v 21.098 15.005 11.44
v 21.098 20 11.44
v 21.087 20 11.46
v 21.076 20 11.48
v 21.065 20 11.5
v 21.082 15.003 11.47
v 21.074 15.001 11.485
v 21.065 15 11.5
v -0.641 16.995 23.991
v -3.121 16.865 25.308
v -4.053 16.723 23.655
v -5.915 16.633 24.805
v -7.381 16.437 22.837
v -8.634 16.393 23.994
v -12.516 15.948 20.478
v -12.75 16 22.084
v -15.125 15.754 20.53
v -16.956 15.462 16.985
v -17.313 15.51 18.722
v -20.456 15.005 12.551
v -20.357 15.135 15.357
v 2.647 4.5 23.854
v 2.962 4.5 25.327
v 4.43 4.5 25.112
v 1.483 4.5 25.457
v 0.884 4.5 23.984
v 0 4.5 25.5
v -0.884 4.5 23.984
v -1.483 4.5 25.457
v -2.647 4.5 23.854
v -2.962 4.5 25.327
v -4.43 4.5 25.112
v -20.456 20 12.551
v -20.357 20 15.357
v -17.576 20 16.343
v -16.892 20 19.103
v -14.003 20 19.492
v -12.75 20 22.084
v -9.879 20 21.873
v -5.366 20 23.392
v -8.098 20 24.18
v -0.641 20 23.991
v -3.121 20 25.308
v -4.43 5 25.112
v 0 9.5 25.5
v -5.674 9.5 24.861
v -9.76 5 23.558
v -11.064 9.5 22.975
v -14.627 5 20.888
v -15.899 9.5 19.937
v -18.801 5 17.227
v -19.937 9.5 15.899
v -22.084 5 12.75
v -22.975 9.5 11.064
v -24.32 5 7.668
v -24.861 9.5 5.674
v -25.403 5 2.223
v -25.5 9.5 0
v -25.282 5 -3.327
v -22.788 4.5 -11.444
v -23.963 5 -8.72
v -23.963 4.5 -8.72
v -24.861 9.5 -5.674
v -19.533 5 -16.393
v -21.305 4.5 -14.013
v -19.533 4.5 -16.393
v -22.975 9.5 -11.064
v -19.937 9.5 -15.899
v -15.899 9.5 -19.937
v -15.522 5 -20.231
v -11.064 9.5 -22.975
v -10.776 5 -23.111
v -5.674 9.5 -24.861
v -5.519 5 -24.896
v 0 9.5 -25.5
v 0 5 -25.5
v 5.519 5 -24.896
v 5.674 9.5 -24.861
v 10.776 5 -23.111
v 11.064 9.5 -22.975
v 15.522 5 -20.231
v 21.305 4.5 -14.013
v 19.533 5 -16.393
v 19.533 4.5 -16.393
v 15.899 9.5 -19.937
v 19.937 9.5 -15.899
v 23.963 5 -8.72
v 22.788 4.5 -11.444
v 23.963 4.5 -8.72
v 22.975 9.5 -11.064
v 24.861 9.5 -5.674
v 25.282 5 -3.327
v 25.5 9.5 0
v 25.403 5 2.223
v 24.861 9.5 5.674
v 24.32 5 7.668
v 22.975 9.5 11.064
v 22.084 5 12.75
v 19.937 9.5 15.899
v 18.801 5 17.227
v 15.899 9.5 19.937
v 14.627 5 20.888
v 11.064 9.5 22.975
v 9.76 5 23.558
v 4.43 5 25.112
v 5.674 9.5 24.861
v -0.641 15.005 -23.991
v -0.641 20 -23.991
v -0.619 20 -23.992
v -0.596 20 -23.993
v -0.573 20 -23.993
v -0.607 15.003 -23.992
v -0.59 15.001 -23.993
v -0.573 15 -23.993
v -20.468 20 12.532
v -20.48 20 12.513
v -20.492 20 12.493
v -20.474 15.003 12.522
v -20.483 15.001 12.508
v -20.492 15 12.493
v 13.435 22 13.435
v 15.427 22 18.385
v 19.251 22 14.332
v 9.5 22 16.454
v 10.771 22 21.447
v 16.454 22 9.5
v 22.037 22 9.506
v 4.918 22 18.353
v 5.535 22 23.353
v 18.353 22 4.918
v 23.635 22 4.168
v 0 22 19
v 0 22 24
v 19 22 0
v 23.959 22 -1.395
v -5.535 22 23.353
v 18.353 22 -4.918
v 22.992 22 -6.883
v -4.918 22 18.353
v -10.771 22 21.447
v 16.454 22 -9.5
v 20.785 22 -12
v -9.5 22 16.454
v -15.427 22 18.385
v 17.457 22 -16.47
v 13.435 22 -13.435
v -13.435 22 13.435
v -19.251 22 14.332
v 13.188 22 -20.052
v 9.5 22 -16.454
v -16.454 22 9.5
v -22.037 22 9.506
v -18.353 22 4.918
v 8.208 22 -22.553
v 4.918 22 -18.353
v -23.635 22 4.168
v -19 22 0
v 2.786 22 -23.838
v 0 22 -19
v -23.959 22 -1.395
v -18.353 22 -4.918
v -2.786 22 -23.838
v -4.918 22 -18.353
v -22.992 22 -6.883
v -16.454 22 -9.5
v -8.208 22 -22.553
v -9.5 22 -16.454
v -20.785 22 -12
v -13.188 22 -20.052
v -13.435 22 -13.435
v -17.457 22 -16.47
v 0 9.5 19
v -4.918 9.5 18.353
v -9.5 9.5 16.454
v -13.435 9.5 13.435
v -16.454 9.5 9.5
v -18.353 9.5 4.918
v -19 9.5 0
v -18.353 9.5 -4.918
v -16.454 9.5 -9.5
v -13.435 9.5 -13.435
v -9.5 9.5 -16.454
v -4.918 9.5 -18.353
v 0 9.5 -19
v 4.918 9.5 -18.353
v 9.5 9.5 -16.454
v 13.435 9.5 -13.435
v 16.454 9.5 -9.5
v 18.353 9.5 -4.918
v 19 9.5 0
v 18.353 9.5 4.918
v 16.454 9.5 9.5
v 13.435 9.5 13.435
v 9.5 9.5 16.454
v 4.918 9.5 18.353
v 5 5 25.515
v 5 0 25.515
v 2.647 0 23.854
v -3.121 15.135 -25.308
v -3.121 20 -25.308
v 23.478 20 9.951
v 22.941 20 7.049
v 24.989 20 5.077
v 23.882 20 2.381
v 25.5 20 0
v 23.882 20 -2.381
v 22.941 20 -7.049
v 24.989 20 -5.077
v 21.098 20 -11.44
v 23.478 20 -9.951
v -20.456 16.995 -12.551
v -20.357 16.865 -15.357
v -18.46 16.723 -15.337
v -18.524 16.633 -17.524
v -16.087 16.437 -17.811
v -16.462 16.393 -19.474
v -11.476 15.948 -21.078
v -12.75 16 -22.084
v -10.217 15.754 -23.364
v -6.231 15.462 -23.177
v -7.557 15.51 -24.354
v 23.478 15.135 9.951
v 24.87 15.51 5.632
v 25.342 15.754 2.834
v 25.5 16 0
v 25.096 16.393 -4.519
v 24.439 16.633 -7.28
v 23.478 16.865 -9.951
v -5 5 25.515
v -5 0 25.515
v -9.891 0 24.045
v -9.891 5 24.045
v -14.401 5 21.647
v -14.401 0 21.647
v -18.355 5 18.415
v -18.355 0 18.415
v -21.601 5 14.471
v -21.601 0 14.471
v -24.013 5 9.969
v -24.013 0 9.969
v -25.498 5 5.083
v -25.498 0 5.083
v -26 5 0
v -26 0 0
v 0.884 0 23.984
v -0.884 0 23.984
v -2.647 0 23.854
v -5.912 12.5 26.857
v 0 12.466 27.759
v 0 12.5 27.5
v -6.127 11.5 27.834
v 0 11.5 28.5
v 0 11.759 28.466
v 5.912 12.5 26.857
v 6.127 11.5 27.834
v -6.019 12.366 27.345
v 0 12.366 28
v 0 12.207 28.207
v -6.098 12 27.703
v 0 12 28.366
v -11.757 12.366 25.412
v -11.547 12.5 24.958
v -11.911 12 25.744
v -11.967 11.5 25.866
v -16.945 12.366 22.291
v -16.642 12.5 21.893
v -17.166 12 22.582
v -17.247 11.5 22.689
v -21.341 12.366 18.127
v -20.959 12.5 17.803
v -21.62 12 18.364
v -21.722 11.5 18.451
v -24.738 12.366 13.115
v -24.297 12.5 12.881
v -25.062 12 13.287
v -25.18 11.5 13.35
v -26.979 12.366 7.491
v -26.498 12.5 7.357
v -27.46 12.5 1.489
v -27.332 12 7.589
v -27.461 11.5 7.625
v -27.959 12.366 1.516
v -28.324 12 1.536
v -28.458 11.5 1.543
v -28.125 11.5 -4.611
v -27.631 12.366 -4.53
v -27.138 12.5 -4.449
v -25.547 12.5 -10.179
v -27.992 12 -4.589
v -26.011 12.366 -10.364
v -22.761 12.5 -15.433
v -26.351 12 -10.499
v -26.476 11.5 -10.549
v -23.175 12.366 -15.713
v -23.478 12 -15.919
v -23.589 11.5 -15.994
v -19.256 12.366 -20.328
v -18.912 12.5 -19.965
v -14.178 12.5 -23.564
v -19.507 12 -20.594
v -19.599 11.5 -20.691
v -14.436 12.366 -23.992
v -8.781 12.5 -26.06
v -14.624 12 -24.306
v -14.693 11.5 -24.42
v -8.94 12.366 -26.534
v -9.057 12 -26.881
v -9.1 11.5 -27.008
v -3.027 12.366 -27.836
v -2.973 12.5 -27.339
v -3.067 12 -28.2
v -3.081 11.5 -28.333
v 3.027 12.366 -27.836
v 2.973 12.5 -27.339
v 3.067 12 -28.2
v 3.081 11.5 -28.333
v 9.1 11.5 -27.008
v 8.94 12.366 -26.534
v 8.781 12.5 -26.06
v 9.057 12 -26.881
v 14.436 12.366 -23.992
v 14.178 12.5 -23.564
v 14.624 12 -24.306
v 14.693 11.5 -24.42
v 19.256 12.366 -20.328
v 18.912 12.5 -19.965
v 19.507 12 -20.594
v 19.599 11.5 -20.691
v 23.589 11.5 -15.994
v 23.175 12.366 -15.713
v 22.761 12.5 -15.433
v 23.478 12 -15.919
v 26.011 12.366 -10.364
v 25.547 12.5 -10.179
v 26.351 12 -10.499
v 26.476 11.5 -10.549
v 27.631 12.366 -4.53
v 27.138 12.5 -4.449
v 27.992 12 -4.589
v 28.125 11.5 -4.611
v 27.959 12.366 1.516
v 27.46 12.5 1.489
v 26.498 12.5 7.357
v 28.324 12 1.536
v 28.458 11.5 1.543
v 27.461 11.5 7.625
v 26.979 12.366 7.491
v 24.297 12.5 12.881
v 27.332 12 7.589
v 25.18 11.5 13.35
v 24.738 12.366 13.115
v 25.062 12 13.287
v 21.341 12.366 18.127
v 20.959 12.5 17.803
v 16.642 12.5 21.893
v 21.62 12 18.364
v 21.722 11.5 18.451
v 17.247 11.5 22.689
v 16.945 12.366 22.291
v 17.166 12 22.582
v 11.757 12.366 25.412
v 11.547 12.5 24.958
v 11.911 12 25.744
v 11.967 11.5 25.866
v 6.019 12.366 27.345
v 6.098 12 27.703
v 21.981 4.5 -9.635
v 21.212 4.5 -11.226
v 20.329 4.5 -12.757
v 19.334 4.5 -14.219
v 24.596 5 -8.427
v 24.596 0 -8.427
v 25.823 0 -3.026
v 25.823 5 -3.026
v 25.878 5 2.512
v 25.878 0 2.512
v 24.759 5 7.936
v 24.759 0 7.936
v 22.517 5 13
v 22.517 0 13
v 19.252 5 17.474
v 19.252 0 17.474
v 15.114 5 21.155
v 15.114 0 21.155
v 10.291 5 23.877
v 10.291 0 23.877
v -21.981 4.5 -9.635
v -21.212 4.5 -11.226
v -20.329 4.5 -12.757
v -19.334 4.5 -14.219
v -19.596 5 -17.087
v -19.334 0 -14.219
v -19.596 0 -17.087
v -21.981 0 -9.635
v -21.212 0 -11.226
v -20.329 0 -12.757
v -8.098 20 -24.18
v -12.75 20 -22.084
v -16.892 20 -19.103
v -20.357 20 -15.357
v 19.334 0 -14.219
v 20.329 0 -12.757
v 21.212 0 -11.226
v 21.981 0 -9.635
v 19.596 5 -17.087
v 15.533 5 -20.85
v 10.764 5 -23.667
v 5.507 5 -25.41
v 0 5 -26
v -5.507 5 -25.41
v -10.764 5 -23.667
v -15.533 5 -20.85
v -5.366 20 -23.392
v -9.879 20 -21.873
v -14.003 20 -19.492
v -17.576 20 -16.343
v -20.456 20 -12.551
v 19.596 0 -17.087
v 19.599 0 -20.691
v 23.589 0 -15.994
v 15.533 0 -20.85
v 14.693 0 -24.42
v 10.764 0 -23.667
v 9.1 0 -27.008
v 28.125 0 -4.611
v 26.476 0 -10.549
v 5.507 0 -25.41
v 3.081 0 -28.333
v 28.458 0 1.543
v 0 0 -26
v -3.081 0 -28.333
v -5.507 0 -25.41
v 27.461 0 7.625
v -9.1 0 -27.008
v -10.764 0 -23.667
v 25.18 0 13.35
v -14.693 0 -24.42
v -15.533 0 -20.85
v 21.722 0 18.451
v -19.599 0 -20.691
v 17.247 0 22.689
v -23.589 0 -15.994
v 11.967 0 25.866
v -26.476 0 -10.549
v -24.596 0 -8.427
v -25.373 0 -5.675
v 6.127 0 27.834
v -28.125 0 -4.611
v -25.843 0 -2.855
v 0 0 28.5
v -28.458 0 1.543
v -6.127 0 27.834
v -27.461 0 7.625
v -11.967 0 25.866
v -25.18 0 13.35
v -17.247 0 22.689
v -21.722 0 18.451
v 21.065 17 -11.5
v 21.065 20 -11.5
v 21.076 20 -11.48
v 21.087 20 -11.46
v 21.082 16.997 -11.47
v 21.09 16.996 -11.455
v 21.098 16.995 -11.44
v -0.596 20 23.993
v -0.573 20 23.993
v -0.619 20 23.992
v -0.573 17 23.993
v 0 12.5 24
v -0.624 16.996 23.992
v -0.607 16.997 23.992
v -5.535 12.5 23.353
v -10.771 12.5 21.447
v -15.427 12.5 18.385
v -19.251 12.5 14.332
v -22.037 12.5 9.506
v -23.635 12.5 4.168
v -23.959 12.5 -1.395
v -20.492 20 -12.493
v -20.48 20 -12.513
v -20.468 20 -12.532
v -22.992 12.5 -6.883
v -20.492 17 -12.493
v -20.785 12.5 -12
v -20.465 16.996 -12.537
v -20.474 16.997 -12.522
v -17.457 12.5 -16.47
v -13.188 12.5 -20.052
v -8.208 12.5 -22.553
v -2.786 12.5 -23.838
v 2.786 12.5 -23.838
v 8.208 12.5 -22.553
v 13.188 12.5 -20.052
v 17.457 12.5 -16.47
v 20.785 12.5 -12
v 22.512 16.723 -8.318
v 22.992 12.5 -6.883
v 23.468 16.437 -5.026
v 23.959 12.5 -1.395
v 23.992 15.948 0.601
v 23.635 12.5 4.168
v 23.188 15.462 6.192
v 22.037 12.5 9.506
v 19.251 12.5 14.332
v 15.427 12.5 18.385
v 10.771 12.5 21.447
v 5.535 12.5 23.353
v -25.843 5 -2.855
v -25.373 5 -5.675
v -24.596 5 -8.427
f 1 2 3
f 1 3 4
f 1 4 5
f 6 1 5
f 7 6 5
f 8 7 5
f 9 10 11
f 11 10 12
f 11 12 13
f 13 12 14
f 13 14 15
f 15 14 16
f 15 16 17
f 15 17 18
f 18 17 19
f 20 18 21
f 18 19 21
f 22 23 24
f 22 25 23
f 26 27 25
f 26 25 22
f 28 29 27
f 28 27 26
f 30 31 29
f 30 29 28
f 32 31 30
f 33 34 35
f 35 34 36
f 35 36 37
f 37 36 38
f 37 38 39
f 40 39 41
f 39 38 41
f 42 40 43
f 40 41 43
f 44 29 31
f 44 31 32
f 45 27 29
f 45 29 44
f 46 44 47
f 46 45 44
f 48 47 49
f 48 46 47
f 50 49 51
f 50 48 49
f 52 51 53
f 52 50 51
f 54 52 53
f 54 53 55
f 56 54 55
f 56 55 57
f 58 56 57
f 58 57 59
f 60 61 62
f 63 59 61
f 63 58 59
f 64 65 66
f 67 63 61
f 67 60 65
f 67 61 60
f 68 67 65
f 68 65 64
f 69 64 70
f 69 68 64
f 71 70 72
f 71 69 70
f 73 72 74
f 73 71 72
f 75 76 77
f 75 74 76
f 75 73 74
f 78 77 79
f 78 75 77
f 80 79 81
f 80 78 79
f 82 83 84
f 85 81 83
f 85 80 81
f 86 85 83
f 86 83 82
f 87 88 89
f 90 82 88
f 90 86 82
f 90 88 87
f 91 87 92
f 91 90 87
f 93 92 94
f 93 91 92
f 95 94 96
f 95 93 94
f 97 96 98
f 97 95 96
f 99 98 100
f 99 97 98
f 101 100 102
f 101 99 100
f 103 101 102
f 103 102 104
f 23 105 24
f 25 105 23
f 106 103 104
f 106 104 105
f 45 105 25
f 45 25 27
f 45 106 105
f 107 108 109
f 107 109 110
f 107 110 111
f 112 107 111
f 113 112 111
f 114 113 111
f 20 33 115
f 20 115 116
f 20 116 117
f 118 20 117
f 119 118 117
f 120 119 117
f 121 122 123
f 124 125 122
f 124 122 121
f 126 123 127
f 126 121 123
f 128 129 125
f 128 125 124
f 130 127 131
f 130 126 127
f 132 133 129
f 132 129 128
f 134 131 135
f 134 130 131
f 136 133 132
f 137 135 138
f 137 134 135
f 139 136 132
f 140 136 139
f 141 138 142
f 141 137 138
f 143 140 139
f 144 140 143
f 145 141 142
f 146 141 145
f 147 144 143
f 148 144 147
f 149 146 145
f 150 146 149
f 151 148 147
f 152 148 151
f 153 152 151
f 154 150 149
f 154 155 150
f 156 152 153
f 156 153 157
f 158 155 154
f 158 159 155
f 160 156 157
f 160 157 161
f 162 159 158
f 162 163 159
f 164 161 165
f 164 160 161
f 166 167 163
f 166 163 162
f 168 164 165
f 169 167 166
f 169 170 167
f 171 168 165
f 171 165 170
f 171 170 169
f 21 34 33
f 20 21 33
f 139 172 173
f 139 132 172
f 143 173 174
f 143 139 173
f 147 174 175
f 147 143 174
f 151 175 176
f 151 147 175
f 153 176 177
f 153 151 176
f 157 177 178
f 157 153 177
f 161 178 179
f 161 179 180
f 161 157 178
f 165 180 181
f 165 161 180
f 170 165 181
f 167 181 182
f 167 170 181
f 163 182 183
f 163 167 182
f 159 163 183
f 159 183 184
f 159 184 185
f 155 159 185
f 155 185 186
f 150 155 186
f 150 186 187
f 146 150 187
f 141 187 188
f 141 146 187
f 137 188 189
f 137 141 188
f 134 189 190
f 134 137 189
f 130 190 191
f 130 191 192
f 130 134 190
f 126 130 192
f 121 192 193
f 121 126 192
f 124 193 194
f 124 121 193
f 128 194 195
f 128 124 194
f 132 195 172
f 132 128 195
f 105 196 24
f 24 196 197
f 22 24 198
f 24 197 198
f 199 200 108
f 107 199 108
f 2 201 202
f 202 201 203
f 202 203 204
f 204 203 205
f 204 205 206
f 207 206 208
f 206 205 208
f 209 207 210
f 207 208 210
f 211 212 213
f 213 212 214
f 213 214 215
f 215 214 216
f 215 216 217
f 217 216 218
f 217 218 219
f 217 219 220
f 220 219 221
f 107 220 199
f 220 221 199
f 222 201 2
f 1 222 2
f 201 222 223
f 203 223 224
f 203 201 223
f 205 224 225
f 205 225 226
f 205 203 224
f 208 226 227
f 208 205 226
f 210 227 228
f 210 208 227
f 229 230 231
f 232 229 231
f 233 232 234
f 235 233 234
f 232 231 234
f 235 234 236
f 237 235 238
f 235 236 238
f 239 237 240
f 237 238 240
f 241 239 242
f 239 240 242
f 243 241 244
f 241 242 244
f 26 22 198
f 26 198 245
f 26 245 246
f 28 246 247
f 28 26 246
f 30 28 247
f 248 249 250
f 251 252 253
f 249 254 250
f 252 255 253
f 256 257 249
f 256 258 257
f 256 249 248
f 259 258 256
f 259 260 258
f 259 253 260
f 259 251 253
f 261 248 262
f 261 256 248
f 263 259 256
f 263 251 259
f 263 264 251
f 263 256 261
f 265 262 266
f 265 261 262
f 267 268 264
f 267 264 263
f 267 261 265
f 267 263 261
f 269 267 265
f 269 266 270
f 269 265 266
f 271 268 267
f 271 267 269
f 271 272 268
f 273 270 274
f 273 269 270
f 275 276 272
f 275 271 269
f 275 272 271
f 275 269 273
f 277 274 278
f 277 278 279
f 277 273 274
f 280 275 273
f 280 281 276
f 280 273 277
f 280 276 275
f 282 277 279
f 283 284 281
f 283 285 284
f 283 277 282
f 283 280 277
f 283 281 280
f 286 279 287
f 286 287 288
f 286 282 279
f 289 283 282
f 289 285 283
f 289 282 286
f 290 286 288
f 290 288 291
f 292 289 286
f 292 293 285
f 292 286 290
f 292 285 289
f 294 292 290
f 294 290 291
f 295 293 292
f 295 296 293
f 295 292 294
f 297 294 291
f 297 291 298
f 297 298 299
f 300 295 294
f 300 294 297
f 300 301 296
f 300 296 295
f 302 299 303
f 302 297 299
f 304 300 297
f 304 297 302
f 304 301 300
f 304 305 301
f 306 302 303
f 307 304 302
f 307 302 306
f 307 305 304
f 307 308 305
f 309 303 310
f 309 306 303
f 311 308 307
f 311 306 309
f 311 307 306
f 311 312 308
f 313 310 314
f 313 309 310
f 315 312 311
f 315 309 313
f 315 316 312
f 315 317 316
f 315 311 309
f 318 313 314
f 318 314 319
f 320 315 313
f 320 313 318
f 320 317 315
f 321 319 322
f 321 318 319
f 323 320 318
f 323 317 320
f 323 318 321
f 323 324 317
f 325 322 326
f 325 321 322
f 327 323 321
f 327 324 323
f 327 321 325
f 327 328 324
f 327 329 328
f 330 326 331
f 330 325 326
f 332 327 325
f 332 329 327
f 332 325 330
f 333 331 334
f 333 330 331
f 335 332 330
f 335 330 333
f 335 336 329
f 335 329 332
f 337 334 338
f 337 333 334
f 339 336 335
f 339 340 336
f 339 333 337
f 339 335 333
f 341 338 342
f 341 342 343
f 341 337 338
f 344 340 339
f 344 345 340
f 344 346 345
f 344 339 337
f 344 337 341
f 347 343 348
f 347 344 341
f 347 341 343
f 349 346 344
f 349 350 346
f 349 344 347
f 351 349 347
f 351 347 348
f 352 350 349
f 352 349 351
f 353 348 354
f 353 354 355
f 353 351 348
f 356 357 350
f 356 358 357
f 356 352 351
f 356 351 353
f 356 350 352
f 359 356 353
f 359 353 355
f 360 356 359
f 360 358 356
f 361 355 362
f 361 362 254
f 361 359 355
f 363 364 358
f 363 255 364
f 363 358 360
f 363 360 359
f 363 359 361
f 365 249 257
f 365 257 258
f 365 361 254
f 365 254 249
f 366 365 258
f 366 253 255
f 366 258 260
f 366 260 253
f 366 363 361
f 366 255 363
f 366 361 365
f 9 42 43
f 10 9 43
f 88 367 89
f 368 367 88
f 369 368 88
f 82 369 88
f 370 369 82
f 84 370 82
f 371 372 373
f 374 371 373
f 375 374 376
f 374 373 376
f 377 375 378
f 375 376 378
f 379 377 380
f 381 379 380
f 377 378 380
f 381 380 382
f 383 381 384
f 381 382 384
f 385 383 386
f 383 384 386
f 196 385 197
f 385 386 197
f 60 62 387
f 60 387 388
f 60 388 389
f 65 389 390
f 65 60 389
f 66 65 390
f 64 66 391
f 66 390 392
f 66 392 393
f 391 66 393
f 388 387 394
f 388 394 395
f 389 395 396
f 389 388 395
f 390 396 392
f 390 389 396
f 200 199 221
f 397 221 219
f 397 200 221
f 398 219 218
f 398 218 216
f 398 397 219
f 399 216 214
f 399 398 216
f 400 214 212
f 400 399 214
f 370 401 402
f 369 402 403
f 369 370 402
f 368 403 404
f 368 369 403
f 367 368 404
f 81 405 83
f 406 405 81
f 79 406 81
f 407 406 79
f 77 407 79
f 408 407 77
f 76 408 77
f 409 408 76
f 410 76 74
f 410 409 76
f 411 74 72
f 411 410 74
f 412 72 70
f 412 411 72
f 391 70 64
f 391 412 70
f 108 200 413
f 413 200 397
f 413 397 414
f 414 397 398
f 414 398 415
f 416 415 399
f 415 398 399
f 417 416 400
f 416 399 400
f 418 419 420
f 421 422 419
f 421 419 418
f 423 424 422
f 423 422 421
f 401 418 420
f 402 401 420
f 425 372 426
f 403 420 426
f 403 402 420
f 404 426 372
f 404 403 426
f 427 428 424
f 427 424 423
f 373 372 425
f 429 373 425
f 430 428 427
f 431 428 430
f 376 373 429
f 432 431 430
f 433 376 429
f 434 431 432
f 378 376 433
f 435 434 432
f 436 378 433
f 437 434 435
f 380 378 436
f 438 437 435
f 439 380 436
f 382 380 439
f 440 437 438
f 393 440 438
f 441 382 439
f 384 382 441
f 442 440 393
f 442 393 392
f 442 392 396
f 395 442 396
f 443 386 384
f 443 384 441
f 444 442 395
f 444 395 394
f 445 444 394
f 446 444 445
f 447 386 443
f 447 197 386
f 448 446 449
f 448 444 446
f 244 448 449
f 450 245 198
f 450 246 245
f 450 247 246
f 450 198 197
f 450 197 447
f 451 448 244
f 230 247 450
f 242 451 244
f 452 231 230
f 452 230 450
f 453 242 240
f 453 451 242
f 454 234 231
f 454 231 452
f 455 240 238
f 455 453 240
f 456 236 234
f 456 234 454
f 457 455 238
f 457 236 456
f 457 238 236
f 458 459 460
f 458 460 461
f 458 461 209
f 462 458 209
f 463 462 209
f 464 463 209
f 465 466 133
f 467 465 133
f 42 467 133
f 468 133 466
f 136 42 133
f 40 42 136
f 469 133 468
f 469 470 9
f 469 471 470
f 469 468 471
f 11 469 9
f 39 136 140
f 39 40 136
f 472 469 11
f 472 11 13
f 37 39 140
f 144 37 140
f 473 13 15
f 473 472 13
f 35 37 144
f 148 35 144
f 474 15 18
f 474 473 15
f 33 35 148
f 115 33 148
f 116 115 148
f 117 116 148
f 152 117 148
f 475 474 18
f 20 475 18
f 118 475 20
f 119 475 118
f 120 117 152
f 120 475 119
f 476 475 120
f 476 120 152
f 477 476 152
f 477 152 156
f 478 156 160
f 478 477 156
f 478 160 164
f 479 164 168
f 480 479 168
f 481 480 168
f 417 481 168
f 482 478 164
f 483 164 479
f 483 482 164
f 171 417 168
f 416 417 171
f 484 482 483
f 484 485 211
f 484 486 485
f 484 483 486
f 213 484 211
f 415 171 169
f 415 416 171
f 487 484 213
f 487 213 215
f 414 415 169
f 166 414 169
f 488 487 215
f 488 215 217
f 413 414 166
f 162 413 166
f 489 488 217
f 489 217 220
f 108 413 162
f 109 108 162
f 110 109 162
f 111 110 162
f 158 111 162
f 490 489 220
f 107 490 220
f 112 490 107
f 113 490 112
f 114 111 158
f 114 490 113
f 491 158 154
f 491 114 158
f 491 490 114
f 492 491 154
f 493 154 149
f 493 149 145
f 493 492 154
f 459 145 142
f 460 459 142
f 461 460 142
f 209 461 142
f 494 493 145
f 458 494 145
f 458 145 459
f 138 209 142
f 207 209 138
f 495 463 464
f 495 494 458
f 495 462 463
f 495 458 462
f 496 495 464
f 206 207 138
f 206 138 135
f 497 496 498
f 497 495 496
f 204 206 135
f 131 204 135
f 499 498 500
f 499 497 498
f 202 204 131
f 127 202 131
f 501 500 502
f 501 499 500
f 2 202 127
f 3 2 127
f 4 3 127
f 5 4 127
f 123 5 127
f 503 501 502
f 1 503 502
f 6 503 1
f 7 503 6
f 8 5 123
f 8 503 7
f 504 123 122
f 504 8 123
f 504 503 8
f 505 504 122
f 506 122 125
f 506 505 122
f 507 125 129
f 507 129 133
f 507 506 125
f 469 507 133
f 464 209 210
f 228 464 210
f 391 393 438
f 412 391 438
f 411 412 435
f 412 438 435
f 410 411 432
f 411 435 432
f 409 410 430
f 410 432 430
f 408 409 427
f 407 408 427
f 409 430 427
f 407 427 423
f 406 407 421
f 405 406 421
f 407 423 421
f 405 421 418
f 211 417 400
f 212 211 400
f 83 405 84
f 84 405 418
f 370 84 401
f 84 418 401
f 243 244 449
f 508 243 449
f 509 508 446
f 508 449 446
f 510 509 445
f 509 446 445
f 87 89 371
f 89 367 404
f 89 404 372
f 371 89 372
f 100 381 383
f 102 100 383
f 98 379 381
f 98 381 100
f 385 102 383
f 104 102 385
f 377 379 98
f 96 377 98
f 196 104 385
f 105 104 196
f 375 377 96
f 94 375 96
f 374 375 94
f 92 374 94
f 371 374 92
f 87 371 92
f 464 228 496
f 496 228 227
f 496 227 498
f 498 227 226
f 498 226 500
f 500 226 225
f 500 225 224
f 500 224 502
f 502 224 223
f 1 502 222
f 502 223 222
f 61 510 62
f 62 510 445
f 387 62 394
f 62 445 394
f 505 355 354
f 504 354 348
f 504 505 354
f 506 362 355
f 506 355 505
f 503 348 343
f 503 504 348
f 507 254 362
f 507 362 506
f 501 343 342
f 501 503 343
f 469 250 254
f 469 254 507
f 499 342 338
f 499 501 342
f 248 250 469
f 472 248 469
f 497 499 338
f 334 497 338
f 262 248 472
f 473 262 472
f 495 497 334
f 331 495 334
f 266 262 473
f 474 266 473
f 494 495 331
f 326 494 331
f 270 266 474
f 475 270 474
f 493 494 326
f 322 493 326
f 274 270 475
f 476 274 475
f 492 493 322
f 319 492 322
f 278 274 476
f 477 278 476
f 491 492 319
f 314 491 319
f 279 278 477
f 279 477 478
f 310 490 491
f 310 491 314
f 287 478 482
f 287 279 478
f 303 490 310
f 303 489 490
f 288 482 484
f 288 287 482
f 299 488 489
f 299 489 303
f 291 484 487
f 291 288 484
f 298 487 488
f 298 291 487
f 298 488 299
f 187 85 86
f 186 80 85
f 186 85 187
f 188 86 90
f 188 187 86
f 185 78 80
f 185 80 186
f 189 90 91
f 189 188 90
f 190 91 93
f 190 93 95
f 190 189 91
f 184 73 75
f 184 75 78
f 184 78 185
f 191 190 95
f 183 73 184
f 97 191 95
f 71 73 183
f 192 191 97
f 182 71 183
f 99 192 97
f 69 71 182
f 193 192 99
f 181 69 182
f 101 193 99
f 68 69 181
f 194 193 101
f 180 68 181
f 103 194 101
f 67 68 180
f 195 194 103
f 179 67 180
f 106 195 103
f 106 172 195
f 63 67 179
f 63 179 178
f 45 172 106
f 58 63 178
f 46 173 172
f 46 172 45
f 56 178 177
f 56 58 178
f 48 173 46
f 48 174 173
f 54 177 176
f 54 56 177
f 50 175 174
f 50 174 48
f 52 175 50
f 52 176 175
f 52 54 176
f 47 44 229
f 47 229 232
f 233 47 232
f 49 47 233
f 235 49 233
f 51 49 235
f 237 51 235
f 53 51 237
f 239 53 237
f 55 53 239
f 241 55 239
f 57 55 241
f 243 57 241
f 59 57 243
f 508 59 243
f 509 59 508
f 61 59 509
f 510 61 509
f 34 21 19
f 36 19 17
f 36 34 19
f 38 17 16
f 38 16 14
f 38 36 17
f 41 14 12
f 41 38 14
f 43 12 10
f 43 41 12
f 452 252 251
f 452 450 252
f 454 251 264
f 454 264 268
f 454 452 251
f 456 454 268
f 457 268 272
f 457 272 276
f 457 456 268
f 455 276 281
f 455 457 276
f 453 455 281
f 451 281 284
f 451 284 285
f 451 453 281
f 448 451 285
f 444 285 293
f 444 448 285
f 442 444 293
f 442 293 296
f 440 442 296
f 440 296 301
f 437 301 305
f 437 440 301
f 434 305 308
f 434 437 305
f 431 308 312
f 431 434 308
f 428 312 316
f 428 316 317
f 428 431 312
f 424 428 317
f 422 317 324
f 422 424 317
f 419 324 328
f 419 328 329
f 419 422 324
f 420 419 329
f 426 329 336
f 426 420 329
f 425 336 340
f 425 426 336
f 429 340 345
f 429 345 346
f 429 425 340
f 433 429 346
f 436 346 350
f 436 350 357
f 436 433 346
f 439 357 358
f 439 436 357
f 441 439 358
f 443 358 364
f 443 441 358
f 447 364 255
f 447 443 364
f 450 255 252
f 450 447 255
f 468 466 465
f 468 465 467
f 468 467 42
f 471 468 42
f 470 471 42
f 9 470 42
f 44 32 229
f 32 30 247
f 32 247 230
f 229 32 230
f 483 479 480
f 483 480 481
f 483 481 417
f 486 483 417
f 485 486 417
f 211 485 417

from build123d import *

# Parameters (mm, degrees)
CUT_EXTRUDE_1_DEPTH      = 5
EXTRUDE_1_DEPTH          = 6
PATTERN_CIRCULAR_1_COUNT = 3
SKETCH_4_R               = 42.404307435
SKETCH_4_R_2             = 25.5
CUT_EXTRUDE_2_DEPTH      = 9.5
CHAMFER_START            = 14
CHAMFER_1_DEPTH          = 6


with BuildPart() as part:
    # Эскиз1 → Повернуть1 (revolve)
    with BuildSketch(Plane.XY, mode=Mode.PRIVATE) as revolve_1_sk:
        with BuildLine():
            Line((-24, 0), (-24, 4.5))
            Line((-24, 4.5), (-25.5, 4.5))
            Line((-25.5, 4.5), (-25.5, 9.5))
            Line((-25.5, 9.5), (-19, 9.5))
            Line((-19, 9.5), (-19, 22))
            Line((-19, 22), (-24, 22))
            Line((-24, 22), (-24, 12.5))
            Line((-24, 12.5), (-27.5, 12.5))
            ThreePointArc((-27.5, 12.5), (-28.207106781, 12.207106781), (-28.5, 11.5))
            Line((-28.5, 11.5), (-28.5, 0))
            Line((-28.5, 0), (-24, 0))
        make_face()
    revolve(revolve_1_sk.sketch.rotate(Axis((0, 0, 0), (0, -1, 0)), 270), axis=Axis((0, 0, 0), (0, -1, 0)))

    # Эскиз2 → Вырез-Вытянуть1 (cut)
    with BuildSketch(Plane(origin=(0, 0, 0), x_dir=(-1, 0, 0), z_dir=(0, -1, 0))):
        with BuildLine():
            ThreePointArc((24, 0), (17.8818714, -16.007456864), (2.646777063, -23.85360709))
            Line((2.646777063, -23.85360709), (5, -25.514701644))
            ThreePointArc((5, -25.514701644), (20.0748599, -16.522711642), (26, 0))
            ThreePointArc((26, 0), (25.646694472, 4.271658071), (24.596379794, 8.427223803))
            Line((24.596379794, 8.427223803), (21.981218243, 9.63462737))
            ThreePointArc((21.981218243, 9.63462737), (23.489883331, 4.921928594), (24, 0))
        make_face()
        with BuildLine():
            Line((-5, -25.514701644), (-2.646777063, -23.85360709))
            ThreePointArc((-2.646777063, -23.85360709), (-20.784609691, -12), (-21.981218243, 9.63462737))
            Line((-21.981218243, 9.63462737), (-24.596379794, 8.427223803))
            ThreePointArc((-24.596379794, 8.427223803), (-22.516660498, -13), (-5, -25.514701644))
        make_face()
        with BuildLine():
            Line((-19.596379794, 17.087477841), (-19.33444118, 14.218979719))
            ThreePointArc((-19.33444118, 14.218979719), (0, 24), (19.33444118, 14.218979719))
            Line((19.33444118, 14.218979719), (19.596379794, 17.087477841))
            ThreePointArc((19.596379794, 17.087477841), (0, 26), (-19.596379794, 17.087477841))
        make_face()
    extrude(amount=-CUT_EXTRUDE_1_DEPTH, mode=Mode.SUBTRACT)

    # Эскиз3 → Бобышка-Вытянуть1 (add)
    with BuildSketch(Plane(origin=(25.5, 0, 0), x_dir=(0, 0, -1), z_dir=(1, 0, 0))):
        Polygon((-11.5, 20), (11.5, 20), (11.5, 17), (-11.5, 15), align=None)
    extrude_1 = extrude(amount=-EXTRUDE_1_DEPTH)

    # Круговой массив1: Бобышка-Вытянуть1 ×3 about axis
    pattern_circular_1_axis = Axis((0, 0, 0), (0, 1, 0))
    for i in range(1, PATTERN_CIRCULAR_1_COUNT):
        add(extrude_1.rotate(pattern_circular_1_axis, i * 360 / PATTERN_CIRCULAR_1_COUNT))

    # Эскиз4 → Вырез-Вытянуть2 (cut)
    with BuildSketch(Plane(origin=(0, 22, 0), x_dir=(1, 0, 0), z_dir=(0, 1, 0))):
        Circle(SKETCH_4_R)
        with Locations(Location((0, 0, 0), (0, 0, 270))):
            Circle(SKETCH_4_R_2, mode=Mode.SUBTRACT)
    extrude(amount=-CUT_EXTRUDE_2_DEPTH, mode=Mode.SUBTRACT)

    # Фаска1: read off the stored shape, not the designer's step
    # Фаска1 outline → Фаска1 (cut)
    with BuildSketch(Plane(origin=(0, 0, 0), x_dir=(1, 0, 0), z_dir=(0, 1, 0)).offset(CHAMFER_START)):
        with BuildLine():
            Line((-20.456443185, 12.551252218), (-20.356857991, 15.357354354))
            ThreePointArc((-20.356857991, 15.357354354), (-20.859675731, 14.667103612), (-21.33909882, 13.960403344))
            Line((-21.33909882, 13.960403344), (-20.49197936, 12.493149399))
            ThreePointArc((-20.49197936, 12.493149399), (-20.474231883, 12.522213414), (-20.456443185, 12.551252218))
        make_face()
        with BuildLine():
            ThreePointArc((-1.420514533, 25.460403344), (-2.272246462, 25.398560904), (-3.12143001, 25.308233338))
            Line((-3.12143001, 25.308233338), (-0.641481678, 23.991425578))
            ThreePointArc((-0.641481678, 23.991425578), (-0.607438987, 23.992311641), (-0.573395073, 23.993149399))
            Line((-0.573395073, 23.993149399), (-1.420514533, 25.460403344))
        make_face()
        with BuildLine():
            ThreePointArc((-20.456443185, -12.551252218), (-20.474231883, -12.522213414), (-20.49197936, -12.493149399))
            Line((-20.49197936, -12.493149399), (-21.33909882, -13.960403344))
            ThreePointArc((-21.33909882, -13.960403344), (-20.859675731, -14.667103612), (-20.356857991, -15.357354354))
            Line((-20.356857991, -15.357354354), (-20.456443185, -12.551252218))
        make_face()
        with BuildLine():
            Line((22.759613353, 11.5), (21.065374433, 11.5))
            ThreePointArc((21.065374433, 11.5), (21.08167087, 11.470098227), (21.097924862, 11.44017336))
            Line((21.097924862, 11.44017336), (23.478288, 9.950878984))
            ThreePointArc((23.478288, 9.950878984), (23.131922194, 10.731457292), (22.759613353, 11.5))
        make_face()
        with BuildLine():
            ThreePointArc((-0.573395073, -23.993149399), (-0.607438987, -23.992311641), (-0.641481678, -23.991425578))
            Line((-0.641481678, -23.991425578), (-3.12143001, -25.308233338))
            ThreePointArc((-3.12143001, -25.308233338), (-2.272246462, -25.398560904), (-1.420514533, -25.460403344))
            Line((-1.420514533, -25.460403344), (-0.573395073, -23.993149399))
        make_face()
        with BuildLine():
            ThreePointArc((22.759613353, -11.5), (23.131922194, -10.731457292), (23.478288, -9.950878984))
            Line((23.478288, -9.950878984), (21.097924862, -11.44017336))
            ThreePointArc((21.097924862, -11.44017336), (21.08167087, -11.470098227), (21.065374433, -11.5))
            Line((21.065374433, -11.5), (22.759613353, -11.5))
        make_face()
    extrude(amount=CHAMFER_1_DEPTH, mode=Mode.SUBTRACT)


solid = part.part
